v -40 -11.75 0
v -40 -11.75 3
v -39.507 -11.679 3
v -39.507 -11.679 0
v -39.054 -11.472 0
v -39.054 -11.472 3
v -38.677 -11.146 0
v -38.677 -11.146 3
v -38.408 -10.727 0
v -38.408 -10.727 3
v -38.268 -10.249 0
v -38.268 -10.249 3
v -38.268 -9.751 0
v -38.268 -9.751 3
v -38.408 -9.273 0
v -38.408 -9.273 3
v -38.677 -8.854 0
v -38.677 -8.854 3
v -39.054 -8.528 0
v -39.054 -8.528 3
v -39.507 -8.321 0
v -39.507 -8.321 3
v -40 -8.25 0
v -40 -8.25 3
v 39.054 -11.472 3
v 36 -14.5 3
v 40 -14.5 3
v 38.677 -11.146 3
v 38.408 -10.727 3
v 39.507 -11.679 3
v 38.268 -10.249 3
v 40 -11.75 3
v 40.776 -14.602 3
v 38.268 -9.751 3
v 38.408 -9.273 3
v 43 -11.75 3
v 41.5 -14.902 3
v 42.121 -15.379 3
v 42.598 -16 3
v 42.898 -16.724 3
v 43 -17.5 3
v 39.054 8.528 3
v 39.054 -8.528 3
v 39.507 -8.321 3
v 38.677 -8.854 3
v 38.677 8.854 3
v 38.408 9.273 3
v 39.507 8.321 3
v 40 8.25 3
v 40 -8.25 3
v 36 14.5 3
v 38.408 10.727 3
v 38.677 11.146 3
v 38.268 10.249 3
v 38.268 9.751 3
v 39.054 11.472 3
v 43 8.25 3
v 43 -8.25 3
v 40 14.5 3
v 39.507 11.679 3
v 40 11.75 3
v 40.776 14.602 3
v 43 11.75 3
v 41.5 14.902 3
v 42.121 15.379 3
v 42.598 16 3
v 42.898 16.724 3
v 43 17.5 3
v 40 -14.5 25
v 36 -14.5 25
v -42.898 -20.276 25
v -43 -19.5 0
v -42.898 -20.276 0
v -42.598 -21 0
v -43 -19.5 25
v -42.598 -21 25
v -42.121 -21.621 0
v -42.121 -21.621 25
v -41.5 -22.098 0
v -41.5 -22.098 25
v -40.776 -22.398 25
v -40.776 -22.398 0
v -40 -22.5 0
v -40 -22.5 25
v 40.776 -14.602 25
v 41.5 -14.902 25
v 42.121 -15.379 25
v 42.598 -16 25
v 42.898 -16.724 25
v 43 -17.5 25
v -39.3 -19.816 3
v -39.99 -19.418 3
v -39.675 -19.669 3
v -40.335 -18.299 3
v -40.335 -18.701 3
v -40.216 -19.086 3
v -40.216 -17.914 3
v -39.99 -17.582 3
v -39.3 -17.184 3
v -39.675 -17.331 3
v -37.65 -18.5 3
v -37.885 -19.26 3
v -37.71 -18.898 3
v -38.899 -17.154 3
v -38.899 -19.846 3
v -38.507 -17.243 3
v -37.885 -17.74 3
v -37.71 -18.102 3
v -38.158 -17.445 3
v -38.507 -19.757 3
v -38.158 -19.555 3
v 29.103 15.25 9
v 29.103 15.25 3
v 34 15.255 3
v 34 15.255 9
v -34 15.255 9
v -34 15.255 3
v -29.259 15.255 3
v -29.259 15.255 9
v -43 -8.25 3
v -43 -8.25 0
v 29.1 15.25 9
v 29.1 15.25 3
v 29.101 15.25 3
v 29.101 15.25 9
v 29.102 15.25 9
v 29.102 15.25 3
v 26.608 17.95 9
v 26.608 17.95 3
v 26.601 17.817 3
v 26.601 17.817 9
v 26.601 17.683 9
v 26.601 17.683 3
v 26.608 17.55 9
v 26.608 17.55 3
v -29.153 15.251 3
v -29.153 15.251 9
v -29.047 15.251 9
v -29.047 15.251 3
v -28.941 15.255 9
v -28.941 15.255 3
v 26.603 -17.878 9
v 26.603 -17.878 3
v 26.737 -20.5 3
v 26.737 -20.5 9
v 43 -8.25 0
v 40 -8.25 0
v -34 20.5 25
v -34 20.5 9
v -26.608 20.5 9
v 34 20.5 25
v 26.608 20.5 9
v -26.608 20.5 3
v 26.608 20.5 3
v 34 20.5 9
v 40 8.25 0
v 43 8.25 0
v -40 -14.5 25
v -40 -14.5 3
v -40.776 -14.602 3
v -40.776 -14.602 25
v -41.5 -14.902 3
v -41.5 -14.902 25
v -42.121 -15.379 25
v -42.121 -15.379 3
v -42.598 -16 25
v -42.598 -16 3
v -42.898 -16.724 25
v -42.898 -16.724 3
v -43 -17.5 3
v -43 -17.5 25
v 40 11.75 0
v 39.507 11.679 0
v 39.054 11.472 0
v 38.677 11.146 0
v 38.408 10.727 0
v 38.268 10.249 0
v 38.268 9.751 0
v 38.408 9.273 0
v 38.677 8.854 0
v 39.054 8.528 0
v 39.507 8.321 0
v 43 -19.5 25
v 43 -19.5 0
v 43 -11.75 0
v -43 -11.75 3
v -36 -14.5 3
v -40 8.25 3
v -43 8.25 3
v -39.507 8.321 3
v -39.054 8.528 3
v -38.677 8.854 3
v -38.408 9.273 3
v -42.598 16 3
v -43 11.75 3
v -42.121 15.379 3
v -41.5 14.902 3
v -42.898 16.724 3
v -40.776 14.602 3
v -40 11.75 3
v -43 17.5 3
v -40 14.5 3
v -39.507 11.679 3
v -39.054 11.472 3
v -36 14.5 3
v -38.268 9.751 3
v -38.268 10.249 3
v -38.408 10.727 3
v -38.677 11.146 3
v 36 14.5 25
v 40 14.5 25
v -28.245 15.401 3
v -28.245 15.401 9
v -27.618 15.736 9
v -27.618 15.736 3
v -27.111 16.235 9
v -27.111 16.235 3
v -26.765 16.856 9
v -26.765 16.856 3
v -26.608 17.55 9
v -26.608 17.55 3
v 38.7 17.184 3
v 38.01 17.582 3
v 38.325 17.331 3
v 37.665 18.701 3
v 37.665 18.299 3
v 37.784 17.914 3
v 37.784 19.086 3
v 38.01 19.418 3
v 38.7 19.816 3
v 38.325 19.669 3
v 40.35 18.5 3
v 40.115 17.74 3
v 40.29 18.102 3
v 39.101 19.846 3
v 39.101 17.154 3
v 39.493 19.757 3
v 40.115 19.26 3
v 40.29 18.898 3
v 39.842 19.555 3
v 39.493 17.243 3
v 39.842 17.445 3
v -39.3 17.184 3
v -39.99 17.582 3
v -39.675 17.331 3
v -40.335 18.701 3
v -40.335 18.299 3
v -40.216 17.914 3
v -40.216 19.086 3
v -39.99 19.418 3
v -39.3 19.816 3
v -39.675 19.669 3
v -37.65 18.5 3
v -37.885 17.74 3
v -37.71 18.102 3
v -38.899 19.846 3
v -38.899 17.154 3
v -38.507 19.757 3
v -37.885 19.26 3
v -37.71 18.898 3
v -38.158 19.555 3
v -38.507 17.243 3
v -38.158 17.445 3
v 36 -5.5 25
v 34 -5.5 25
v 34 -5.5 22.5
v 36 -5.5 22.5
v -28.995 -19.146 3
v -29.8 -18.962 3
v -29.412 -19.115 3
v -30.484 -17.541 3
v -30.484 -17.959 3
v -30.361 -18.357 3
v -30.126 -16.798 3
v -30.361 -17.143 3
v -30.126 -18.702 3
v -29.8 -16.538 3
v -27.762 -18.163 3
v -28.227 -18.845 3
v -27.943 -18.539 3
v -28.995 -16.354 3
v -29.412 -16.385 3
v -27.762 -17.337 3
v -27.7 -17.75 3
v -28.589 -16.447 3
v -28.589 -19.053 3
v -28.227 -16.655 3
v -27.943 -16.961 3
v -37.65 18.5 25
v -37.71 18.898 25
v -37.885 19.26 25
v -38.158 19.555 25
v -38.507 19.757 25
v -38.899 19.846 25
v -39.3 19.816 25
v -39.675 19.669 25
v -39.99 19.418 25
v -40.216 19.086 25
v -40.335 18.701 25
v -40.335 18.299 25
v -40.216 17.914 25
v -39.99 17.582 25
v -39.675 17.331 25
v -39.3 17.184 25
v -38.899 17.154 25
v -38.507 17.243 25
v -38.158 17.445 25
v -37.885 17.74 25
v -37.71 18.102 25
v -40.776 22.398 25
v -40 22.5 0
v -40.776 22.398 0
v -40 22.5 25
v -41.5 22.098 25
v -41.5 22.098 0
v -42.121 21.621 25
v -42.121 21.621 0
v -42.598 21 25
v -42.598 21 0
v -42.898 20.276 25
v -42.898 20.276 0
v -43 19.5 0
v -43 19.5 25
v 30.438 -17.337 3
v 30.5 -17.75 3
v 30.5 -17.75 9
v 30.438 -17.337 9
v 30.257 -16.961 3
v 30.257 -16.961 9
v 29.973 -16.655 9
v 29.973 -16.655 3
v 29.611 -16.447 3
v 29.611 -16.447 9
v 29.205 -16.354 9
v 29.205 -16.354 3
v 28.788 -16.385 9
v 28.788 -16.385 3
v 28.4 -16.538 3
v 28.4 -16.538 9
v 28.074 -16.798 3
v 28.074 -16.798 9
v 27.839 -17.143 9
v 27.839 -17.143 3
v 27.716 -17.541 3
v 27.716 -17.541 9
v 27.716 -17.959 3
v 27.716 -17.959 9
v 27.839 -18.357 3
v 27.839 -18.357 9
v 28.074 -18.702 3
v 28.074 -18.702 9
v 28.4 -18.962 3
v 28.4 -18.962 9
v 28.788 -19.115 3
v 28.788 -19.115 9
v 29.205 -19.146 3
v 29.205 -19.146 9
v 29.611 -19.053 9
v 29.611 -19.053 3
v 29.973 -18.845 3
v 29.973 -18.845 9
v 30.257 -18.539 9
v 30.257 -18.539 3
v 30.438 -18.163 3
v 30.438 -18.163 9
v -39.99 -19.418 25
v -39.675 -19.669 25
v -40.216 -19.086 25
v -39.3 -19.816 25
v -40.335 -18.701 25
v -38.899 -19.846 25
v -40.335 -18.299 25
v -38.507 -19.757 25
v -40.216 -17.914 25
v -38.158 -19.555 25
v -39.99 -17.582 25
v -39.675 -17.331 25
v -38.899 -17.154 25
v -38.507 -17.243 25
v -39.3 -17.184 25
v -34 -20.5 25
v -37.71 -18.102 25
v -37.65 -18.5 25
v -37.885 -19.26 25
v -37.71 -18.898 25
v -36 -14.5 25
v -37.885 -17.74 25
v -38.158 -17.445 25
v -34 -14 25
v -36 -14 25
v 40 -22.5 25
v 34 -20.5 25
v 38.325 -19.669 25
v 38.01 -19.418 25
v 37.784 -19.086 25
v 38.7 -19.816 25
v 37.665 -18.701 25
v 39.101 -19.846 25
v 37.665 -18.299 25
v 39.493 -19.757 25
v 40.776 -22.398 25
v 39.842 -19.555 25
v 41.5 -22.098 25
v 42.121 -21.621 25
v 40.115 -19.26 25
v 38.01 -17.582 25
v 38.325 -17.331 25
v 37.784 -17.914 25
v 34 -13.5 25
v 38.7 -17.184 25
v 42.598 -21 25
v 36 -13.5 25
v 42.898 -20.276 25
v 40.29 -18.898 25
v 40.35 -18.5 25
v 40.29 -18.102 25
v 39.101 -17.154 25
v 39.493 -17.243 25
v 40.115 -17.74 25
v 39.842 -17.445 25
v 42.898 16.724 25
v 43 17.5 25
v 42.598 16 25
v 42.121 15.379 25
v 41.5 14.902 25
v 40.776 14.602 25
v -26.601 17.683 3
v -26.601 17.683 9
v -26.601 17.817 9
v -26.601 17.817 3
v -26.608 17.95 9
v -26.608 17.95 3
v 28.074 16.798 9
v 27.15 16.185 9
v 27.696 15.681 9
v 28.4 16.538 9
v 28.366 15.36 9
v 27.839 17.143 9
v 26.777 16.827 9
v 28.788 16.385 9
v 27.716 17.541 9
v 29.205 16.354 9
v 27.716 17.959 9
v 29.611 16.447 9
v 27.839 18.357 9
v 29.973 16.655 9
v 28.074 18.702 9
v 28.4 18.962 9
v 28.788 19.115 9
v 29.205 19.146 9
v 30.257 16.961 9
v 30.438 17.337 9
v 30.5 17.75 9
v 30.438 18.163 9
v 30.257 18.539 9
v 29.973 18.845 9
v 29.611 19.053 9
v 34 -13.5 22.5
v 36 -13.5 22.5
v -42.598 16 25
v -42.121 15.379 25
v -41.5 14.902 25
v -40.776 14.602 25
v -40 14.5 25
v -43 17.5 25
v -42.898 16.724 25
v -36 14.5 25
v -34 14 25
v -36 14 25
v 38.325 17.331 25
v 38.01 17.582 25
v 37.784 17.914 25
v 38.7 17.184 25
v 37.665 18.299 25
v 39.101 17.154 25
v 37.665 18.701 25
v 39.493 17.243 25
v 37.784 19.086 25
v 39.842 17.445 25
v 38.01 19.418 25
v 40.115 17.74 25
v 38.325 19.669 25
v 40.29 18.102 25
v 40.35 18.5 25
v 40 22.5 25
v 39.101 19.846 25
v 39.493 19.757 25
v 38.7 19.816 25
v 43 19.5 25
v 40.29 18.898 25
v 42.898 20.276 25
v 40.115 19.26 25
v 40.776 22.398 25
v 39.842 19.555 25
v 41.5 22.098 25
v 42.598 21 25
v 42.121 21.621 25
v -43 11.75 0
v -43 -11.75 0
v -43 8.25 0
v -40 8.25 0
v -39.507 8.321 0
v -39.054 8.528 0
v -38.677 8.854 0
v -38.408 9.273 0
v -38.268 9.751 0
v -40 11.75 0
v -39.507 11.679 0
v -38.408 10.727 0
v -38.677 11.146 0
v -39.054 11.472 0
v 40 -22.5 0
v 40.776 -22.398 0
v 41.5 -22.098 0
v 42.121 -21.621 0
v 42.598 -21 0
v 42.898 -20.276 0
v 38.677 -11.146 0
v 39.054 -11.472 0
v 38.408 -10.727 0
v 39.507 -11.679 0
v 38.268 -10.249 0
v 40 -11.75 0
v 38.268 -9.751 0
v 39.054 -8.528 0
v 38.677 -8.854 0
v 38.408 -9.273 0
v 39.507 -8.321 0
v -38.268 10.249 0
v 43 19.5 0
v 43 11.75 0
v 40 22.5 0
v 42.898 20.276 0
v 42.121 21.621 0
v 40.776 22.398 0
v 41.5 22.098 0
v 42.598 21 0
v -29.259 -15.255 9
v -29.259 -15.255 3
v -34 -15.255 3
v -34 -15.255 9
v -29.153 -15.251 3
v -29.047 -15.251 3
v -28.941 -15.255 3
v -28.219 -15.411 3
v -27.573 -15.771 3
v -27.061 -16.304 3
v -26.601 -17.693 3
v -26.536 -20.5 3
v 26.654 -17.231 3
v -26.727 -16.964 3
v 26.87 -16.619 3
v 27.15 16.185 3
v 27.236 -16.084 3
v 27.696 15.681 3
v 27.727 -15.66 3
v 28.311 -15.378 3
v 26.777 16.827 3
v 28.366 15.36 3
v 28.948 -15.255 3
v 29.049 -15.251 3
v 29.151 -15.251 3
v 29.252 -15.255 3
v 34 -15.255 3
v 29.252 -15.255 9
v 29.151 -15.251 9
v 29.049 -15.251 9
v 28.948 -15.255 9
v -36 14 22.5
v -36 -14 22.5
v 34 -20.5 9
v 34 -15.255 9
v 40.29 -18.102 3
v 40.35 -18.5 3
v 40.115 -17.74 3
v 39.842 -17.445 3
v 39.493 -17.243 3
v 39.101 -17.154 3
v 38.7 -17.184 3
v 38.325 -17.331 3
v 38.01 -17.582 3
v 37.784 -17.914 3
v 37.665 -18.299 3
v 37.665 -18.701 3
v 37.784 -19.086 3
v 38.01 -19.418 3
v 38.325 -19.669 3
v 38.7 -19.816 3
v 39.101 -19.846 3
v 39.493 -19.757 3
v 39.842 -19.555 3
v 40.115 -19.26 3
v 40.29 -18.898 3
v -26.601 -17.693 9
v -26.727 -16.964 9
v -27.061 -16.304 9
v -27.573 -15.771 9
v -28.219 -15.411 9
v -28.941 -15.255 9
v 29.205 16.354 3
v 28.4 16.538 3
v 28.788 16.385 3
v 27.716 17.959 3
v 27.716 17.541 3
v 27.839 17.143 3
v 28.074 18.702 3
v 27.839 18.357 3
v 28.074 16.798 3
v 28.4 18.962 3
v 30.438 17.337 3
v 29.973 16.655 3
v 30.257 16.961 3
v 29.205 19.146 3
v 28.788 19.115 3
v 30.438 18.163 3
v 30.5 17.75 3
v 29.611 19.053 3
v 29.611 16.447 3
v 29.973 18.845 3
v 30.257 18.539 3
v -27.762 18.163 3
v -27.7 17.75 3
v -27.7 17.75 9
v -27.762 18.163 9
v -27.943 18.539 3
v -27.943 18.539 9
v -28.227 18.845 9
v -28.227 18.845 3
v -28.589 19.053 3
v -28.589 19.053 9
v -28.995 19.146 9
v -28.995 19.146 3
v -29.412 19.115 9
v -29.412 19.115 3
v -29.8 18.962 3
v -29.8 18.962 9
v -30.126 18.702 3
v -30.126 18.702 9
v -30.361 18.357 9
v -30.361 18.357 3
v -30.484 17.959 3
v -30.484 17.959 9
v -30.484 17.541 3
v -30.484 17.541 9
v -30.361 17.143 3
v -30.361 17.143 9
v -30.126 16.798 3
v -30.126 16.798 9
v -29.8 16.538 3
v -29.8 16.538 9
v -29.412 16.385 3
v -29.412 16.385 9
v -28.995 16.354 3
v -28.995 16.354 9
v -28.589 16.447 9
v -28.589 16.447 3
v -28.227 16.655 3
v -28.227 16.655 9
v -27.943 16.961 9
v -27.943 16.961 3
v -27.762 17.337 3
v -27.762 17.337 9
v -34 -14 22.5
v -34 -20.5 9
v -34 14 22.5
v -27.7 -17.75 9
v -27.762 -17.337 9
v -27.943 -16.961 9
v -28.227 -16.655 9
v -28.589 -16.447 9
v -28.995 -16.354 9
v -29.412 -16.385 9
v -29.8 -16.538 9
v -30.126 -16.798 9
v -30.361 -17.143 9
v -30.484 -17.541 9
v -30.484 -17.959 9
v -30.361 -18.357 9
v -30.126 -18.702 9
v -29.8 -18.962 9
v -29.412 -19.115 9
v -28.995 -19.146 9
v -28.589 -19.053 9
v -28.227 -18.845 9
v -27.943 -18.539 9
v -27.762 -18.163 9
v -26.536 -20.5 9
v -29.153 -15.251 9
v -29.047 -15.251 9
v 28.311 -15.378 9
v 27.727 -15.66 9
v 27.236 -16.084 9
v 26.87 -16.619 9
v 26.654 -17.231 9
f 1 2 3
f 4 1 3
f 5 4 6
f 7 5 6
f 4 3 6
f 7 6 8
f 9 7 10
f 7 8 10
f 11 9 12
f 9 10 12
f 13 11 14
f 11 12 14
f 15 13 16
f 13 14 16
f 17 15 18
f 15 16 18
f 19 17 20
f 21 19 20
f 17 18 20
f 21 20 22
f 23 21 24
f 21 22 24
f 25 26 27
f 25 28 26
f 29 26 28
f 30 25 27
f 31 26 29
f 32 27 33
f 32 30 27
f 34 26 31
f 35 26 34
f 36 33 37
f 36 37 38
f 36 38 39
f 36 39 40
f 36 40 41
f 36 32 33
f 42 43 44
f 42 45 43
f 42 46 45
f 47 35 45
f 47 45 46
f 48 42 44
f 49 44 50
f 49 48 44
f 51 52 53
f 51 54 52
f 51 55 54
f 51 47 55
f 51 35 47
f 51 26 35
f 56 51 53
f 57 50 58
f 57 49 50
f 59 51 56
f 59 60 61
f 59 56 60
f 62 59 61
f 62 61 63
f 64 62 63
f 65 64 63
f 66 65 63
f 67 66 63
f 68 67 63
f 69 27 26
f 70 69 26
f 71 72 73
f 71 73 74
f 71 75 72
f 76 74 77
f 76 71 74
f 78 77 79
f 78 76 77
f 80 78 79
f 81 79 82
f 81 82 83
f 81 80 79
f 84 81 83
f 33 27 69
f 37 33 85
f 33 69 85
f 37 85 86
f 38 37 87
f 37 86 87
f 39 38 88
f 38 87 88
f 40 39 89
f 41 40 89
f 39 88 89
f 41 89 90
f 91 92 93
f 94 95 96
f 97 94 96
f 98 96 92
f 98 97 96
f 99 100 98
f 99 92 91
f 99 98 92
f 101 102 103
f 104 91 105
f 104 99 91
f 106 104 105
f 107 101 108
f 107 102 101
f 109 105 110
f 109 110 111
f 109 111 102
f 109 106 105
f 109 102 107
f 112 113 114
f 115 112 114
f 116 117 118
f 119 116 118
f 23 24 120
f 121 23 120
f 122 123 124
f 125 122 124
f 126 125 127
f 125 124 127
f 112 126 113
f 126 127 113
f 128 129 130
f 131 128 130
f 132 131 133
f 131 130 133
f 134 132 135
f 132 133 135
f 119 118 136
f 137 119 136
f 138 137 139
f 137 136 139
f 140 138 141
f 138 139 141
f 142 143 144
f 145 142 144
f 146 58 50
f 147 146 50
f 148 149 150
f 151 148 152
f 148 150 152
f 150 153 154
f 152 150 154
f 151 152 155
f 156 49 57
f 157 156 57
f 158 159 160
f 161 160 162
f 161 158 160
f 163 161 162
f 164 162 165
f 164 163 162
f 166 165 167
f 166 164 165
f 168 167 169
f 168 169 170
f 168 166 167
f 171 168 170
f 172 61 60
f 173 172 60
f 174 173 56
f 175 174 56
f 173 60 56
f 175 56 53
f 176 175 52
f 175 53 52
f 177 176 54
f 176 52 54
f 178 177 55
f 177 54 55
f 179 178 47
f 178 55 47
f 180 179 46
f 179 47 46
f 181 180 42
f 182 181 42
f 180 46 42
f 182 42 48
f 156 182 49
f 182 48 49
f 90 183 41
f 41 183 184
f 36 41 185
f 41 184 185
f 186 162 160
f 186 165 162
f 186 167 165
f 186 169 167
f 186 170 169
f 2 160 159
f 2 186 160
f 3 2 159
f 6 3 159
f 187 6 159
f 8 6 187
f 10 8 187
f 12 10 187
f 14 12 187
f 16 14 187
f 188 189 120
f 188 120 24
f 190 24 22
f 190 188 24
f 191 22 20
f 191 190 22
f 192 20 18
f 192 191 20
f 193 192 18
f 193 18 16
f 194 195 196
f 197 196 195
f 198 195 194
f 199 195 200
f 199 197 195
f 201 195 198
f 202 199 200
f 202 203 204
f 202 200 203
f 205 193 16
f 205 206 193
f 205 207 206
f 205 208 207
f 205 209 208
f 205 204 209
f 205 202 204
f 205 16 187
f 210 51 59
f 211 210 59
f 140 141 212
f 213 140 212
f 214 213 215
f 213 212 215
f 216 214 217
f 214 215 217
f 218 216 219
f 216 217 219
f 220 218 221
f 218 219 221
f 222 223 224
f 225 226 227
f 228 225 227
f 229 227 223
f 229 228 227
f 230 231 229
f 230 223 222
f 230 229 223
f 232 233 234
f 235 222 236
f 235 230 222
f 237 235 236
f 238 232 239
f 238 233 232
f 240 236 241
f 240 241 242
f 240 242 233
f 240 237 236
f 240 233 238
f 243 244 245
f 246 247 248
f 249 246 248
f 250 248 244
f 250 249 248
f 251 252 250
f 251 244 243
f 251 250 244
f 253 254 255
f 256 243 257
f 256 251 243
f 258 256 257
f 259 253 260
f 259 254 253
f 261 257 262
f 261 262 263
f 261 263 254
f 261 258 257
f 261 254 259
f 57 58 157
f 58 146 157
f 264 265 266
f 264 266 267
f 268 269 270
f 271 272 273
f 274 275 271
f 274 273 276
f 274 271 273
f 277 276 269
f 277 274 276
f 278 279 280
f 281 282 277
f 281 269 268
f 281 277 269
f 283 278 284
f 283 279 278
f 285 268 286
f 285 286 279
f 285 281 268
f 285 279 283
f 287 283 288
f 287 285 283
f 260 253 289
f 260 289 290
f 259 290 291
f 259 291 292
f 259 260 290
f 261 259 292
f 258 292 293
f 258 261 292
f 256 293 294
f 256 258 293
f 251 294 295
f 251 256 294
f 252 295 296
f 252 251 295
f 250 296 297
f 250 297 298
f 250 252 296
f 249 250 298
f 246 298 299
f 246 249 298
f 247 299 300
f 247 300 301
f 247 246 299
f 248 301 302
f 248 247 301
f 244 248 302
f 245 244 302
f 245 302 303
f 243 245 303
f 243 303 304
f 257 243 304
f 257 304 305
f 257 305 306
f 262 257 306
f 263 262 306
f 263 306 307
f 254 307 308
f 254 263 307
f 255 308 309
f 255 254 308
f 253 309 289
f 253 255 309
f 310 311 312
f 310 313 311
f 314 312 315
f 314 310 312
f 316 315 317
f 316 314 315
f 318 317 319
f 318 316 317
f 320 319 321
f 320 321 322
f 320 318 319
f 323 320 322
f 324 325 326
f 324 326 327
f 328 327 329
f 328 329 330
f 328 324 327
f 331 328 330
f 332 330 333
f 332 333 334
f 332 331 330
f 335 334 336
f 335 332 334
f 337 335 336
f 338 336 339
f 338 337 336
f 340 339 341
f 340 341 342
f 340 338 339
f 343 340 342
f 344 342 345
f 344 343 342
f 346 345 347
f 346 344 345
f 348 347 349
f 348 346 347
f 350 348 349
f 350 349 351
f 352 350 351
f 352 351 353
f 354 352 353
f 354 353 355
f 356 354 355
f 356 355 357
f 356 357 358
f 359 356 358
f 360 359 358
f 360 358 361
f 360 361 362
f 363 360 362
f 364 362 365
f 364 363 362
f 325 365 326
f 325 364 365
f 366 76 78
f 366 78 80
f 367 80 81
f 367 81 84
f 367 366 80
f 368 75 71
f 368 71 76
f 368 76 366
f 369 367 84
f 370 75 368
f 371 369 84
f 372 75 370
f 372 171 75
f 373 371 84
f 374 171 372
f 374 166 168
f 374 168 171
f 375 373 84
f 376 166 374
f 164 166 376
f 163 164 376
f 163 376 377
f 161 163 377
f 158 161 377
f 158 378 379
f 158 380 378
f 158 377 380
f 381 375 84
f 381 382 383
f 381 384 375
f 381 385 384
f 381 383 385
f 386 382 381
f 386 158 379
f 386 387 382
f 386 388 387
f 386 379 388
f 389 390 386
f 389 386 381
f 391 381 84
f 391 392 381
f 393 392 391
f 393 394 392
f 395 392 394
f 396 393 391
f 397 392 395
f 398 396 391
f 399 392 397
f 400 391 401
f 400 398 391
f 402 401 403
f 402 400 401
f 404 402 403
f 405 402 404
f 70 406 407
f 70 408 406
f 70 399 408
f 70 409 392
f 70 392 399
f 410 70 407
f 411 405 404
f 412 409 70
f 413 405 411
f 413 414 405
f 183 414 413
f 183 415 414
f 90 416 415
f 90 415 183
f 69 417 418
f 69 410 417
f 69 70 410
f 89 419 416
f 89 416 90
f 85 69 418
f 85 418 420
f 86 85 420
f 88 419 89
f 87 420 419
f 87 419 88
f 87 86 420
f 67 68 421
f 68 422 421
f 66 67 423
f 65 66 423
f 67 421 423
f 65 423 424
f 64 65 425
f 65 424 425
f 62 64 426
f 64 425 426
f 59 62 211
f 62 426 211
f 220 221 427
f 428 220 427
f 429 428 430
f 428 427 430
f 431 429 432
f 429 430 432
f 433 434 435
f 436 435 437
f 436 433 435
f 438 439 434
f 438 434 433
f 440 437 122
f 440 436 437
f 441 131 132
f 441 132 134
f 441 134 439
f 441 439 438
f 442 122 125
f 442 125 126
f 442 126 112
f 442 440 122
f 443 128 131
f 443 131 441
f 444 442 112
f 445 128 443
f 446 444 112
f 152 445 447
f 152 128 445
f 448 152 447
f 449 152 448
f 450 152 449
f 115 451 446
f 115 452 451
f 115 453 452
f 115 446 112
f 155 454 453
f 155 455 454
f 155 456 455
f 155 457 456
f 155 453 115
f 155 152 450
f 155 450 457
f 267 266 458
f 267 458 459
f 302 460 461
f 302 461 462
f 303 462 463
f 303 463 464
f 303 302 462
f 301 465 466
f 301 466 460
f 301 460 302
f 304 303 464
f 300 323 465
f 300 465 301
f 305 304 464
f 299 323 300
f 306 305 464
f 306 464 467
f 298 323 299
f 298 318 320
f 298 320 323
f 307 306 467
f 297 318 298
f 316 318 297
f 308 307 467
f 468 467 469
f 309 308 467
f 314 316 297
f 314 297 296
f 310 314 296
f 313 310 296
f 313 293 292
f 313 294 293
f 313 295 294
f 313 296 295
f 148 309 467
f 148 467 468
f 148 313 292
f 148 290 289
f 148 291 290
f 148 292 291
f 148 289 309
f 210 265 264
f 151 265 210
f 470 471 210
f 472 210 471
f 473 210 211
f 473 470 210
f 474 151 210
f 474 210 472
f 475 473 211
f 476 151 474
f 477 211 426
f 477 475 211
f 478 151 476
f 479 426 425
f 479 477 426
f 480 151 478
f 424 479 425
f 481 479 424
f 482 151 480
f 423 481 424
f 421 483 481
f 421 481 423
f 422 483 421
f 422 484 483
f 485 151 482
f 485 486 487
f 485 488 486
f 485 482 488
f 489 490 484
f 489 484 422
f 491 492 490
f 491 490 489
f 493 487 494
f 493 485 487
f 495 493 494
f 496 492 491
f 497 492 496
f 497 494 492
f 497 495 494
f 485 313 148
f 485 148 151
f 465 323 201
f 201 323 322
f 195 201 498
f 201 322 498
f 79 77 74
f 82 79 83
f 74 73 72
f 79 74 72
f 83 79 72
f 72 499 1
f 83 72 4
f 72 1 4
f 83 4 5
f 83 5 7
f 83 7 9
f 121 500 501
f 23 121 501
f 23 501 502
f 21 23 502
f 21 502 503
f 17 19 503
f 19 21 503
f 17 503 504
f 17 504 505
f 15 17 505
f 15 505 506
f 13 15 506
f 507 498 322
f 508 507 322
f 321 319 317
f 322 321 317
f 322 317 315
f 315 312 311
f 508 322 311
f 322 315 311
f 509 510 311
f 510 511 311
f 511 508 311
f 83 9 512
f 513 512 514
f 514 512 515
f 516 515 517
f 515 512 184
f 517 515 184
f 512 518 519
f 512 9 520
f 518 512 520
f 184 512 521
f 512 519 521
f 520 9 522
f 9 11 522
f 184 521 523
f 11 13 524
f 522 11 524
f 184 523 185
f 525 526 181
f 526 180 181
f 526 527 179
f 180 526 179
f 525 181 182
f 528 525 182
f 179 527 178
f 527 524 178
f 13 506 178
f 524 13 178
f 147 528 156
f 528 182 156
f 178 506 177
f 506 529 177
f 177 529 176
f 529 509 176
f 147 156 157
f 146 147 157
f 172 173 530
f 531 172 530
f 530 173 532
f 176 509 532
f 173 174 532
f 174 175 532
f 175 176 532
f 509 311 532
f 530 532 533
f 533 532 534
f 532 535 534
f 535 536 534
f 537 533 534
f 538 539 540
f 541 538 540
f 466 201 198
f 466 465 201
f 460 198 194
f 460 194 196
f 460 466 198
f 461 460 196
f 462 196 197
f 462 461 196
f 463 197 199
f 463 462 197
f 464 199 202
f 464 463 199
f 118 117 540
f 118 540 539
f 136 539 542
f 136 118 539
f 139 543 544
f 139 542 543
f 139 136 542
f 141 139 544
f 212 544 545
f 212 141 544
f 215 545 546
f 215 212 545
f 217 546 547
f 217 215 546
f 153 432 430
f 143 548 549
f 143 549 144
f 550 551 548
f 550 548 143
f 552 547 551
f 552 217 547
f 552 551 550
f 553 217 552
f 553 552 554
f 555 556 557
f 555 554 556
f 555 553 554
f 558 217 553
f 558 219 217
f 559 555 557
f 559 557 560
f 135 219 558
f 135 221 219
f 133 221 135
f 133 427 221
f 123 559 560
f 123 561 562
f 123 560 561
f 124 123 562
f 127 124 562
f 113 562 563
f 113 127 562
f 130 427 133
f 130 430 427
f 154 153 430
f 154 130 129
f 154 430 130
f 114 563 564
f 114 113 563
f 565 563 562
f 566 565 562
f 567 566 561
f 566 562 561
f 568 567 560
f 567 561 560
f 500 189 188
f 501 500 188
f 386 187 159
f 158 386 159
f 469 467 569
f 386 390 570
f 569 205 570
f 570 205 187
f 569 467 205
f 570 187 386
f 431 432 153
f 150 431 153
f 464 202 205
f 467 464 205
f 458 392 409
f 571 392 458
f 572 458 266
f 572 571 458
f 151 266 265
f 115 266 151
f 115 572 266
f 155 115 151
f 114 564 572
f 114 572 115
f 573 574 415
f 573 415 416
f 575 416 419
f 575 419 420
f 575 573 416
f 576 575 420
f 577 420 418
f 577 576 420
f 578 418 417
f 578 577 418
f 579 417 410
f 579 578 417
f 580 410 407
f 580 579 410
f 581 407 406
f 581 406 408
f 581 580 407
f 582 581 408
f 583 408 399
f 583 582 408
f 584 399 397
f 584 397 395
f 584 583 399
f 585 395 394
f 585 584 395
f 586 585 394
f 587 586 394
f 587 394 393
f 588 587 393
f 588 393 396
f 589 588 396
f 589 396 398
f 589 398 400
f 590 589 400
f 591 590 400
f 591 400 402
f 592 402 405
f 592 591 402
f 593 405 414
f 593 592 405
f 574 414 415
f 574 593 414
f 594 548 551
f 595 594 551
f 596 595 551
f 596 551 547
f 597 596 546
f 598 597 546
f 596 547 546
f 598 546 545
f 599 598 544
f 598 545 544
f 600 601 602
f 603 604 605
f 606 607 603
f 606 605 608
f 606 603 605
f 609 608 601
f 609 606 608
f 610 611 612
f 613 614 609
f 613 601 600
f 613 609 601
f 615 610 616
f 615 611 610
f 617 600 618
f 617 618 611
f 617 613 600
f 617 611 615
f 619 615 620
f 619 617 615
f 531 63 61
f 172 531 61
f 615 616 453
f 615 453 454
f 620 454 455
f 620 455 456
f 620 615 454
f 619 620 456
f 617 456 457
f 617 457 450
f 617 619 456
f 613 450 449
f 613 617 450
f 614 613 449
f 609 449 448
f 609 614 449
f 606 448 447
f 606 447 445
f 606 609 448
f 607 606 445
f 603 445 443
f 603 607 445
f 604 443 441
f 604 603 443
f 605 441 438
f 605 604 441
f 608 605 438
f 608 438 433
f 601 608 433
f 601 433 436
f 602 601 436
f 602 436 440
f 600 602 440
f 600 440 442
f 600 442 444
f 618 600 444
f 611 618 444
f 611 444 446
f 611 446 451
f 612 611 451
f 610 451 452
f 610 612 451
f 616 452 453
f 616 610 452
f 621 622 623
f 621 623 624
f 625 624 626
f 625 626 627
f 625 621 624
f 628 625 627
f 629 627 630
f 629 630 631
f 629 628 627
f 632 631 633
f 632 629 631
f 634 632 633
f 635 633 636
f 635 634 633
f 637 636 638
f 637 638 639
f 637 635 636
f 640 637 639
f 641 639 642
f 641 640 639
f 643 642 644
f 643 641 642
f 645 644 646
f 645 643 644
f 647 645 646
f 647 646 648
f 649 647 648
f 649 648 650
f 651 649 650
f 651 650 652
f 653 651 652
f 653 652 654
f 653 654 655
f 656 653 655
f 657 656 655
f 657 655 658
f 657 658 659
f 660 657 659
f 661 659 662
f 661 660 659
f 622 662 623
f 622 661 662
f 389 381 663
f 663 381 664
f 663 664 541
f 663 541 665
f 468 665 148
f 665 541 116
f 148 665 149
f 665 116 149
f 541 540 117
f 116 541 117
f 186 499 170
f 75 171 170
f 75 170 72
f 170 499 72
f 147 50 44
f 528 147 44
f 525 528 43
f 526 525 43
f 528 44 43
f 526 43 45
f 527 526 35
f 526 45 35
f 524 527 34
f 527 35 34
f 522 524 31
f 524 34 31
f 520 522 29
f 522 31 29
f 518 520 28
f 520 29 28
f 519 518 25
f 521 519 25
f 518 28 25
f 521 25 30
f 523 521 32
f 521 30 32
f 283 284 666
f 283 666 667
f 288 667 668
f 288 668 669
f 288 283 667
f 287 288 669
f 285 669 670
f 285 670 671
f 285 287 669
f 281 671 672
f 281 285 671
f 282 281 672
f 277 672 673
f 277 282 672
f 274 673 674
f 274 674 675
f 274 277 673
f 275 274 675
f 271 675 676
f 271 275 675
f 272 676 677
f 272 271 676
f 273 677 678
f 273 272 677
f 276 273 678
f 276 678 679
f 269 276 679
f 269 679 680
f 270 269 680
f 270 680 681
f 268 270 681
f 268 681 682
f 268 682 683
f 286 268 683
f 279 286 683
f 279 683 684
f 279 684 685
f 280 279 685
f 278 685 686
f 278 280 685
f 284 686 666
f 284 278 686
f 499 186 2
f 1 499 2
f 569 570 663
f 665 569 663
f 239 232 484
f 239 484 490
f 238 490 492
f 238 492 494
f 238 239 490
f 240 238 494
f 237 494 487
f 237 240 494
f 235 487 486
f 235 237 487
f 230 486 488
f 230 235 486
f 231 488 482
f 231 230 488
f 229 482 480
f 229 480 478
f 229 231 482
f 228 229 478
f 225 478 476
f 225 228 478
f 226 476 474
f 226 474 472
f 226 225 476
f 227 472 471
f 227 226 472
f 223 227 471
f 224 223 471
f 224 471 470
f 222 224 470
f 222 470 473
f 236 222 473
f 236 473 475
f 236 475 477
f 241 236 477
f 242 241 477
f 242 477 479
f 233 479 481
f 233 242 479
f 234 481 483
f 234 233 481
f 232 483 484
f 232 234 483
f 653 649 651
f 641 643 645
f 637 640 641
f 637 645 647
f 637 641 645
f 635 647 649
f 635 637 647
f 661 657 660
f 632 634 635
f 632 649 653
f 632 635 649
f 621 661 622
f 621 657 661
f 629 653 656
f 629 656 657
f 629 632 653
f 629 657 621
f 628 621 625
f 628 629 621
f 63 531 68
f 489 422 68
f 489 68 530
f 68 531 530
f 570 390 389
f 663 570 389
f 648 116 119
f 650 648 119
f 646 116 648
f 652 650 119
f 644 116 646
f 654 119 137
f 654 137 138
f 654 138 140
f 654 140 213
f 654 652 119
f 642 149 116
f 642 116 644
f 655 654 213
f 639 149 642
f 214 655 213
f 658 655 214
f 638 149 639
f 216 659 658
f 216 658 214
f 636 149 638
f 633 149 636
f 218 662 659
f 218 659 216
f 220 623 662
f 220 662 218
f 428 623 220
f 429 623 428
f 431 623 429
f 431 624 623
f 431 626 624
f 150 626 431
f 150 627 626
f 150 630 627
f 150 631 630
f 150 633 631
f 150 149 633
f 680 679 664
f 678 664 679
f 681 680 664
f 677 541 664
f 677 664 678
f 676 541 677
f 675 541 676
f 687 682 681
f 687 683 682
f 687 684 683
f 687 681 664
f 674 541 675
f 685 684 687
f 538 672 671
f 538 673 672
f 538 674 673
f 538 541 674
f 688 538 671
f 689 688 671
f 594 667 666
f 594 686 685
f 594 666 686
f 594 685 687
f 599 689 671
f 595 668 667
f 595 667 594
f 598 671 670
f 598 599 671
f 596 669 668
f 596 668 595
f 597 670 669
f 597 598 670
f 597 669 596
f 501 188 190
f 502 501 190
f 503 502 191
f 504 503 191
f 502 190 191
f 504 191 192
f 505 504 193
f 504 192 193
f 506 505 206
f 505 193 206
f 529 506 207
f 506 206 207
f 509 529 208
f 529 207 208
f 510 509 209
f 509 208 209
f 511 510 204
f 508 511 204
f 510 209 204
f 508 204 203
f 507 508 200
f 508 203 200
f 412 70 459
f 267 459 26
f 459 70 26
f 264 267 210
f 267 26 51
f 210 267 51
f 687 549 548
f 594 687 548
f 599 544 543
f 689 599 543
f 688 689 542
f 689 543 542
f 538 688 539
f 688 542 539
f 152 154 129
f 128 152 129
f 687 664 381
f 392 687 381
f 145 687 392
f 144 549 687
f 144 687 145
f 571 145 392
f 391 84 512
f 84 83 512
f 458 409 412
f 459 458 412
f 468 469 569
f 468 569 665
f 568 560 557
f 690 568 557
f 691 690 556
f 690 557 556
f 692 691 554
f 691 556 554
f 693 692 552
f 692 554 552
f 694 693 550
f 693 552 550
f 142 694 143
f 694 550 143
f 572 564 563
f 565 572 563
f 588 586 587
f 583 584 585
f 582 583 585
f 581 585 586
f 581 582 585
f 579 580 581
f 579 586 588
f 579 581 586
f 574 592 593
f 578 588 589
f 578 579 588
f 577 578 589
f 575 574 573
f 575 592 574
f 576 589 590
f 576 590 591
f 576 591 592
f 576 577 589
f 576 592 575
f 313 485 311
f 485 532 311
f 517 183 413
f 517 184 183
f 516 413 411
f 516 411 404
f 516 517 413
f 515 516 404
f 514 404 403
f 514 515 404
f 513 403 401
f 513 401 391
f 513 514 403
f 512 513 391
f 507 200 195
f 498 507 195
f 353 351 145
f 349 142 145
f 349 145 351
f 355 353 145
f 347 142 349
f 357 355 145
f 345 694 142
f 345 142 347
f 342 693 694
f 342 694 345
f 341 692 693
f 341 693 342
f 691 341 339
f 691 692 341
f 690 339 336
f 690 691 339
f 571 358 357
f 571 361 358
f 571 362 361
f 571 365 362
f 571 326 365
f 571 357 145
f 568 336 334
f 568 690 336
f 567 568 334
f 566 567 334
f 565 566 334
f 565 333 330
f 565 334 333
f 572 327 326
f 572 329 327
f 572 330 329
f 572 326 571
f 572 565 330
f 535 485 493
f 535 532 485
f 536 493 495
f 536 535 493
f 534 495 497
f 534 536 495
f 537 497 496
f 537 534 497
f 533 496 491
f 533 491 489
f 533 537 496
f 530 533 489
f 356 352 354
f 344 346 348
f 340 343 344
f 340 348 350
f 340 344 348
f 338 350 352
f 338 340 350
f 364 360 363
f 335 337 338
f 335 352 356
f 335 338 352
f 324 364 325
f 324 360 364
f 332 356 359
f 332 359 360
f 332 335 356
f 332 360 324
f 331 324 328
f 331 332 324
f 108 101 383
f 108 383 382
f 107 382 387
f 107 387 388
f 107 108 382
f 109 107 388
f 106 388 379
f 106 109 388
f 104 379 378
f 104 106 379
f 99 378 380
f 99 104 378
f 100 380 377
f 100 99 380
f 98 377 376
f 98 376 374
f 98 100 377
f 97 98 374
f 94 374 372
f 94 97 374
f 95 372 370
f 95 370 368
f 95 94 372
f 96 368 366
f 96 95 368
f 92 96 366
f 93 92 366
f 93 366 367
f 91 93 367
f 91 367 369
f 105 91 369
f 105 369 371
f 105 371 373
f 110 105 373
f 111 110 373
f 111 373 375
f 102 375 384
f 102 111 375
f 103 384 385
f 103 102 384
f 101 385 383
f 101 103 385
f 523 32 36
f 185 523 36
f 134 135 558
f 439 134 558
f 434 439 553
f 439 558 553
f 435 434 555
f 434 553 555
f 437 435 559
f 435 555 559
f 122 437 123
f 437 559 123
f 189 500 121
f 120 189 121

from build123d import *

# Parameters (mm, degrees)
F0_W      = 86
F0_H      = 45
F1_DEPTH  = 3
F2_R      = 1.35
F2_W      = 68
F2_H      = 41
F3_DEPTH  = 22
F4_R      = 1.4
F5_DEPTH  = 6
F7_DEPTH  = 3.001
F8_R      = 3
F9_W      = 2
F9_H      = 28
F9_H_2    = 8
F10_DEPTH = 2.5


with BuildPart() as f1:
    # F0 (on Top) → F1 (new body)
    with BuildSketch(Plane.XY):
        Rectangle(F0_W, F0_H)
    extrude(amount=F1_DEPTH)

    # F2 (on face) → F3 (join)
    with BuildSketch(Plane.XY.offset(3)):
        Polygon((43, 22.5), (-43, 22.5), (-43, 14.5), (-36, 14.5), (-36, -14.5), (-43, -14.5), (-43, -22.5), (43, -22.5), (43, -14.5), (36, -14.5), (36, 14.5), (43, 14.5), align=None)
        with Locations((-39, -18.5)):
            Circle(F2_R, mode=Mode.SUBTRACT)
        with Locations((39, -18.5)):
            Circle(F2_R, mode=Mode.SUBTRACT)
        with Locations((-39, 18.5)):
            Circle(F2_R, mode=Mode.SUBTRACT)
        Rectangle(F2_W, F2_H, mode=Mode.SUBTRACT)
        with Locations((39, 18.5)):
            Circle(F2_R, mode=Mode.SUBTRACT)
    extrude(amount=F3_DEPTH)

    # F4 (on face) → F5 (join)
    with BuildSketch(Plane.XY.offset(3)):
        with BuildLine():
            Line((-28.9413119942, 15.2550414599), (-29.2586880058, 15.2550414599))
            ThreePointArc((-29.2586880058, 15.2550414599), (-29.1, 15.25), (-28.9413119942, 15.2550414599))
        make_face()
        with BuildLine():
            Line((-34, 15.2550414599), (-29.2586880058, 15.2550414599))
            Line((-29.2586880058, 15.2550414599), (-28.9413119942, 15.2550414599))
            ThreePointArc((-28.9413119942, 15.2550414599), (-27.3470376902, 15.9675513639), (-26.6080353575, 17.5497196457))
            Line((-26.6080353575, 17.5497196457), (-26.6080353575, 17.9502803543))
            Line((-26.6080353575, 17.9502803543), (-26.6080353575, 20.5))
            Line((-26.6080353575, 20.5), (-34, 20.5))
            Line((-34, 20.5), (-34, 15.2550414599))
        make_face()
        with Locations((-29.1, 17.75)):
            Circle(F4_R, mode=Mode.SUBTRACT)
        with BuildLine():
            Line((-26.6080353575, 17.9502803543), (-26.6080353575, 17.5497196457))
            ThreePointArc((-26.6080353575, 17.5497196457), (-26.6, 17.75), (-26.6080353575, 17.9502803543))
        make_face()
        with BuildLine():
            Line((-26.5361216883, -20.5), (-26.6006603156, -17.6925444326))
            ThreePointArc((-26.6006603156, -17.6925444326), (-27.2968273142, -16.018362548), (-28.9414728026, -15.2550312371))
            Line((-28.9414728026, -15.2550312371), (-29.2585271974, -15.2550312371))
            Line((-29.2585271974, -15.2550312371), (-34, -15.2550312371))
            Line((-34, -15.2550312371), (-34, -20.5))
            Line((-34, -20.5), (-26.5361216883, -20.5))
        make_face()
        with Locations((-29.1, -17.75)):
            Circle(F4_R, mode=Mode.SUBTRACT)
        with BuildLine():
            Line((-29.2585271974, -15.2550312371), (-28.9414728026, -15.2550312371))
            ThreePointArc((-28.9414728026, -15.2550312371), (-29.1, -15.25), (-29.2585271974, -15.2550312371))
        make_face()
        with BuildLine():
            Line((26.6080353575, 17.5497196457), (26.6080353575, 17.9502803543))
            ThreePointArc((26.6080353575, 17.9502803543), (26.6, 17.75), (26.6080353575, 17.5497196457))
        make_face()
        with BuildLine():
            Line((26.6080353575, 20.5), (26.6080353575, 17.9502803543))
            Line((26.6080353575, 17.9502803543), (26.6080353575, 17.5497196457))
            ThreePointArc((26.6080353575, 17.5497196457), (27.4045208473, 15.9127873169), (29.1, 15.25))
            ThreePointArc((29.1, 15.25), (29.1012864239, 15.250000331), (29.1025728475, 15.2500013239))
            Line((29.1025728475, 15.2500013239), (34, 15.2550414599))
            Line((34, 15.2550414599), (34, 20.5))
            Line((34, 20.5), (26.6080353575, 20.5))
        make_face()
        with Locations((29.1, 17.75)):
            Circle(F4_R, mode=Mode.SUBTRACT)
        with BuildLine():
            Line((28.9479452437, -15.2546284142), (29.2524526886, -15.254652694))
            ThreePointArc((29.2524526886, -15.254652694), (29.1001993362, -15.2500000079), (28.9479452437, -15.2546284142))
        make_face()
        with BuildLine():
            Line((34, -15.2550312371), (29.2524526886, -15.254652694))
            Line((29.2524526886, -15.254652694), (28.9479452437, -15.2546284142))
            ThreePointArc((28.9479452437, -15.2546284142), (27.236154388, -16.0838428842), (26.6032541645, -17.8775156186))
            Line((26.6032541645, -17.8775156186), (26.7371915935, -20.5))
            Line((26.7371915935, -20.5), (34, -20.5))
            Line((34, -20.5), (34, -15.2550312371))
        make_face()
        with Locations((29.1, -17.75)):
            Circle(F4_R, mode=Mode.SUBTRACT)
    extrude(amount=F5_DEPTH)

    # F6 (on face) → F7 (cut, through all)
    with BuildSketch(Plane.XY.offset(3)):
        with BuildLine():
            Line((-43, 8.25), (-40, 8.25))
            ThreePointArc((-40, 8.25), (-38.25, 10), (-40, 11.75))
            Line((-40, 11.75), (-43, 11.75))
            Line((-43, 11.75), (-43, 8.25))
        make_face()
        with BuildLine():
            Line((-43, -11.75), (-40, -11.75))
            ThreePointArc((-40, -11.75), (-38.25, -10), (-40, -8.25))
            Line((-40, -8.25), (-43, -8.25))
            Line((-43, -8.25), (-43, -11.75))
        make_face()
        with BuildLine():
            ThreePointArc((40, 11.75), (38.25, 10), (40, 8.25))
            Line((40, 8.25), (43, 8.25))
            Line((43, 8.25), (43, 11.75))
            Line((43, 11.75), (40, 11.75))
        make_face()
        with BuildLine():
            ThreePointArc((40, -8.25), (38.25, -10), (40, -11.75))
            Line((40, -11.75), (43, -11.75))
            Line((43, -11.75), (43, -8.25))
            Line((43, -8.25), (40, -8.25))
        make_face()
    extrude(amount=-F7_DEPTH, mode=Mode.SUBTRACT)

    # F8
    f8_edges = [f1.edges().sort_by_distance(p)[0] for p in [
        (-43, -22.5, 12.5),
        (-43, 14.5, 14),
        (-43, 22.5, 12.5),
        (-43, -14.5, 14),
        (43, -22.5, 12.5),
        (43, -14.5, 14),
        (43, 14.5, 14),
        (43, 22.5, 12.5),
    ]]
    fillet(f8_edges, radius=F8_R)

    # F9 (on face) → F10 (cut)
    with BuildSketch(Plane.XY.offset(25)):
        with Locations((-35, 0)):
            Rectangle(F9_W, F9_H)
        with Locations((35, -9.5)):
            Rectangle(F9_W, F9_H_2)
    extrude(amount=-F10_DEPTH, mode=Mode.SUBTRACT)


solid = f1.part
